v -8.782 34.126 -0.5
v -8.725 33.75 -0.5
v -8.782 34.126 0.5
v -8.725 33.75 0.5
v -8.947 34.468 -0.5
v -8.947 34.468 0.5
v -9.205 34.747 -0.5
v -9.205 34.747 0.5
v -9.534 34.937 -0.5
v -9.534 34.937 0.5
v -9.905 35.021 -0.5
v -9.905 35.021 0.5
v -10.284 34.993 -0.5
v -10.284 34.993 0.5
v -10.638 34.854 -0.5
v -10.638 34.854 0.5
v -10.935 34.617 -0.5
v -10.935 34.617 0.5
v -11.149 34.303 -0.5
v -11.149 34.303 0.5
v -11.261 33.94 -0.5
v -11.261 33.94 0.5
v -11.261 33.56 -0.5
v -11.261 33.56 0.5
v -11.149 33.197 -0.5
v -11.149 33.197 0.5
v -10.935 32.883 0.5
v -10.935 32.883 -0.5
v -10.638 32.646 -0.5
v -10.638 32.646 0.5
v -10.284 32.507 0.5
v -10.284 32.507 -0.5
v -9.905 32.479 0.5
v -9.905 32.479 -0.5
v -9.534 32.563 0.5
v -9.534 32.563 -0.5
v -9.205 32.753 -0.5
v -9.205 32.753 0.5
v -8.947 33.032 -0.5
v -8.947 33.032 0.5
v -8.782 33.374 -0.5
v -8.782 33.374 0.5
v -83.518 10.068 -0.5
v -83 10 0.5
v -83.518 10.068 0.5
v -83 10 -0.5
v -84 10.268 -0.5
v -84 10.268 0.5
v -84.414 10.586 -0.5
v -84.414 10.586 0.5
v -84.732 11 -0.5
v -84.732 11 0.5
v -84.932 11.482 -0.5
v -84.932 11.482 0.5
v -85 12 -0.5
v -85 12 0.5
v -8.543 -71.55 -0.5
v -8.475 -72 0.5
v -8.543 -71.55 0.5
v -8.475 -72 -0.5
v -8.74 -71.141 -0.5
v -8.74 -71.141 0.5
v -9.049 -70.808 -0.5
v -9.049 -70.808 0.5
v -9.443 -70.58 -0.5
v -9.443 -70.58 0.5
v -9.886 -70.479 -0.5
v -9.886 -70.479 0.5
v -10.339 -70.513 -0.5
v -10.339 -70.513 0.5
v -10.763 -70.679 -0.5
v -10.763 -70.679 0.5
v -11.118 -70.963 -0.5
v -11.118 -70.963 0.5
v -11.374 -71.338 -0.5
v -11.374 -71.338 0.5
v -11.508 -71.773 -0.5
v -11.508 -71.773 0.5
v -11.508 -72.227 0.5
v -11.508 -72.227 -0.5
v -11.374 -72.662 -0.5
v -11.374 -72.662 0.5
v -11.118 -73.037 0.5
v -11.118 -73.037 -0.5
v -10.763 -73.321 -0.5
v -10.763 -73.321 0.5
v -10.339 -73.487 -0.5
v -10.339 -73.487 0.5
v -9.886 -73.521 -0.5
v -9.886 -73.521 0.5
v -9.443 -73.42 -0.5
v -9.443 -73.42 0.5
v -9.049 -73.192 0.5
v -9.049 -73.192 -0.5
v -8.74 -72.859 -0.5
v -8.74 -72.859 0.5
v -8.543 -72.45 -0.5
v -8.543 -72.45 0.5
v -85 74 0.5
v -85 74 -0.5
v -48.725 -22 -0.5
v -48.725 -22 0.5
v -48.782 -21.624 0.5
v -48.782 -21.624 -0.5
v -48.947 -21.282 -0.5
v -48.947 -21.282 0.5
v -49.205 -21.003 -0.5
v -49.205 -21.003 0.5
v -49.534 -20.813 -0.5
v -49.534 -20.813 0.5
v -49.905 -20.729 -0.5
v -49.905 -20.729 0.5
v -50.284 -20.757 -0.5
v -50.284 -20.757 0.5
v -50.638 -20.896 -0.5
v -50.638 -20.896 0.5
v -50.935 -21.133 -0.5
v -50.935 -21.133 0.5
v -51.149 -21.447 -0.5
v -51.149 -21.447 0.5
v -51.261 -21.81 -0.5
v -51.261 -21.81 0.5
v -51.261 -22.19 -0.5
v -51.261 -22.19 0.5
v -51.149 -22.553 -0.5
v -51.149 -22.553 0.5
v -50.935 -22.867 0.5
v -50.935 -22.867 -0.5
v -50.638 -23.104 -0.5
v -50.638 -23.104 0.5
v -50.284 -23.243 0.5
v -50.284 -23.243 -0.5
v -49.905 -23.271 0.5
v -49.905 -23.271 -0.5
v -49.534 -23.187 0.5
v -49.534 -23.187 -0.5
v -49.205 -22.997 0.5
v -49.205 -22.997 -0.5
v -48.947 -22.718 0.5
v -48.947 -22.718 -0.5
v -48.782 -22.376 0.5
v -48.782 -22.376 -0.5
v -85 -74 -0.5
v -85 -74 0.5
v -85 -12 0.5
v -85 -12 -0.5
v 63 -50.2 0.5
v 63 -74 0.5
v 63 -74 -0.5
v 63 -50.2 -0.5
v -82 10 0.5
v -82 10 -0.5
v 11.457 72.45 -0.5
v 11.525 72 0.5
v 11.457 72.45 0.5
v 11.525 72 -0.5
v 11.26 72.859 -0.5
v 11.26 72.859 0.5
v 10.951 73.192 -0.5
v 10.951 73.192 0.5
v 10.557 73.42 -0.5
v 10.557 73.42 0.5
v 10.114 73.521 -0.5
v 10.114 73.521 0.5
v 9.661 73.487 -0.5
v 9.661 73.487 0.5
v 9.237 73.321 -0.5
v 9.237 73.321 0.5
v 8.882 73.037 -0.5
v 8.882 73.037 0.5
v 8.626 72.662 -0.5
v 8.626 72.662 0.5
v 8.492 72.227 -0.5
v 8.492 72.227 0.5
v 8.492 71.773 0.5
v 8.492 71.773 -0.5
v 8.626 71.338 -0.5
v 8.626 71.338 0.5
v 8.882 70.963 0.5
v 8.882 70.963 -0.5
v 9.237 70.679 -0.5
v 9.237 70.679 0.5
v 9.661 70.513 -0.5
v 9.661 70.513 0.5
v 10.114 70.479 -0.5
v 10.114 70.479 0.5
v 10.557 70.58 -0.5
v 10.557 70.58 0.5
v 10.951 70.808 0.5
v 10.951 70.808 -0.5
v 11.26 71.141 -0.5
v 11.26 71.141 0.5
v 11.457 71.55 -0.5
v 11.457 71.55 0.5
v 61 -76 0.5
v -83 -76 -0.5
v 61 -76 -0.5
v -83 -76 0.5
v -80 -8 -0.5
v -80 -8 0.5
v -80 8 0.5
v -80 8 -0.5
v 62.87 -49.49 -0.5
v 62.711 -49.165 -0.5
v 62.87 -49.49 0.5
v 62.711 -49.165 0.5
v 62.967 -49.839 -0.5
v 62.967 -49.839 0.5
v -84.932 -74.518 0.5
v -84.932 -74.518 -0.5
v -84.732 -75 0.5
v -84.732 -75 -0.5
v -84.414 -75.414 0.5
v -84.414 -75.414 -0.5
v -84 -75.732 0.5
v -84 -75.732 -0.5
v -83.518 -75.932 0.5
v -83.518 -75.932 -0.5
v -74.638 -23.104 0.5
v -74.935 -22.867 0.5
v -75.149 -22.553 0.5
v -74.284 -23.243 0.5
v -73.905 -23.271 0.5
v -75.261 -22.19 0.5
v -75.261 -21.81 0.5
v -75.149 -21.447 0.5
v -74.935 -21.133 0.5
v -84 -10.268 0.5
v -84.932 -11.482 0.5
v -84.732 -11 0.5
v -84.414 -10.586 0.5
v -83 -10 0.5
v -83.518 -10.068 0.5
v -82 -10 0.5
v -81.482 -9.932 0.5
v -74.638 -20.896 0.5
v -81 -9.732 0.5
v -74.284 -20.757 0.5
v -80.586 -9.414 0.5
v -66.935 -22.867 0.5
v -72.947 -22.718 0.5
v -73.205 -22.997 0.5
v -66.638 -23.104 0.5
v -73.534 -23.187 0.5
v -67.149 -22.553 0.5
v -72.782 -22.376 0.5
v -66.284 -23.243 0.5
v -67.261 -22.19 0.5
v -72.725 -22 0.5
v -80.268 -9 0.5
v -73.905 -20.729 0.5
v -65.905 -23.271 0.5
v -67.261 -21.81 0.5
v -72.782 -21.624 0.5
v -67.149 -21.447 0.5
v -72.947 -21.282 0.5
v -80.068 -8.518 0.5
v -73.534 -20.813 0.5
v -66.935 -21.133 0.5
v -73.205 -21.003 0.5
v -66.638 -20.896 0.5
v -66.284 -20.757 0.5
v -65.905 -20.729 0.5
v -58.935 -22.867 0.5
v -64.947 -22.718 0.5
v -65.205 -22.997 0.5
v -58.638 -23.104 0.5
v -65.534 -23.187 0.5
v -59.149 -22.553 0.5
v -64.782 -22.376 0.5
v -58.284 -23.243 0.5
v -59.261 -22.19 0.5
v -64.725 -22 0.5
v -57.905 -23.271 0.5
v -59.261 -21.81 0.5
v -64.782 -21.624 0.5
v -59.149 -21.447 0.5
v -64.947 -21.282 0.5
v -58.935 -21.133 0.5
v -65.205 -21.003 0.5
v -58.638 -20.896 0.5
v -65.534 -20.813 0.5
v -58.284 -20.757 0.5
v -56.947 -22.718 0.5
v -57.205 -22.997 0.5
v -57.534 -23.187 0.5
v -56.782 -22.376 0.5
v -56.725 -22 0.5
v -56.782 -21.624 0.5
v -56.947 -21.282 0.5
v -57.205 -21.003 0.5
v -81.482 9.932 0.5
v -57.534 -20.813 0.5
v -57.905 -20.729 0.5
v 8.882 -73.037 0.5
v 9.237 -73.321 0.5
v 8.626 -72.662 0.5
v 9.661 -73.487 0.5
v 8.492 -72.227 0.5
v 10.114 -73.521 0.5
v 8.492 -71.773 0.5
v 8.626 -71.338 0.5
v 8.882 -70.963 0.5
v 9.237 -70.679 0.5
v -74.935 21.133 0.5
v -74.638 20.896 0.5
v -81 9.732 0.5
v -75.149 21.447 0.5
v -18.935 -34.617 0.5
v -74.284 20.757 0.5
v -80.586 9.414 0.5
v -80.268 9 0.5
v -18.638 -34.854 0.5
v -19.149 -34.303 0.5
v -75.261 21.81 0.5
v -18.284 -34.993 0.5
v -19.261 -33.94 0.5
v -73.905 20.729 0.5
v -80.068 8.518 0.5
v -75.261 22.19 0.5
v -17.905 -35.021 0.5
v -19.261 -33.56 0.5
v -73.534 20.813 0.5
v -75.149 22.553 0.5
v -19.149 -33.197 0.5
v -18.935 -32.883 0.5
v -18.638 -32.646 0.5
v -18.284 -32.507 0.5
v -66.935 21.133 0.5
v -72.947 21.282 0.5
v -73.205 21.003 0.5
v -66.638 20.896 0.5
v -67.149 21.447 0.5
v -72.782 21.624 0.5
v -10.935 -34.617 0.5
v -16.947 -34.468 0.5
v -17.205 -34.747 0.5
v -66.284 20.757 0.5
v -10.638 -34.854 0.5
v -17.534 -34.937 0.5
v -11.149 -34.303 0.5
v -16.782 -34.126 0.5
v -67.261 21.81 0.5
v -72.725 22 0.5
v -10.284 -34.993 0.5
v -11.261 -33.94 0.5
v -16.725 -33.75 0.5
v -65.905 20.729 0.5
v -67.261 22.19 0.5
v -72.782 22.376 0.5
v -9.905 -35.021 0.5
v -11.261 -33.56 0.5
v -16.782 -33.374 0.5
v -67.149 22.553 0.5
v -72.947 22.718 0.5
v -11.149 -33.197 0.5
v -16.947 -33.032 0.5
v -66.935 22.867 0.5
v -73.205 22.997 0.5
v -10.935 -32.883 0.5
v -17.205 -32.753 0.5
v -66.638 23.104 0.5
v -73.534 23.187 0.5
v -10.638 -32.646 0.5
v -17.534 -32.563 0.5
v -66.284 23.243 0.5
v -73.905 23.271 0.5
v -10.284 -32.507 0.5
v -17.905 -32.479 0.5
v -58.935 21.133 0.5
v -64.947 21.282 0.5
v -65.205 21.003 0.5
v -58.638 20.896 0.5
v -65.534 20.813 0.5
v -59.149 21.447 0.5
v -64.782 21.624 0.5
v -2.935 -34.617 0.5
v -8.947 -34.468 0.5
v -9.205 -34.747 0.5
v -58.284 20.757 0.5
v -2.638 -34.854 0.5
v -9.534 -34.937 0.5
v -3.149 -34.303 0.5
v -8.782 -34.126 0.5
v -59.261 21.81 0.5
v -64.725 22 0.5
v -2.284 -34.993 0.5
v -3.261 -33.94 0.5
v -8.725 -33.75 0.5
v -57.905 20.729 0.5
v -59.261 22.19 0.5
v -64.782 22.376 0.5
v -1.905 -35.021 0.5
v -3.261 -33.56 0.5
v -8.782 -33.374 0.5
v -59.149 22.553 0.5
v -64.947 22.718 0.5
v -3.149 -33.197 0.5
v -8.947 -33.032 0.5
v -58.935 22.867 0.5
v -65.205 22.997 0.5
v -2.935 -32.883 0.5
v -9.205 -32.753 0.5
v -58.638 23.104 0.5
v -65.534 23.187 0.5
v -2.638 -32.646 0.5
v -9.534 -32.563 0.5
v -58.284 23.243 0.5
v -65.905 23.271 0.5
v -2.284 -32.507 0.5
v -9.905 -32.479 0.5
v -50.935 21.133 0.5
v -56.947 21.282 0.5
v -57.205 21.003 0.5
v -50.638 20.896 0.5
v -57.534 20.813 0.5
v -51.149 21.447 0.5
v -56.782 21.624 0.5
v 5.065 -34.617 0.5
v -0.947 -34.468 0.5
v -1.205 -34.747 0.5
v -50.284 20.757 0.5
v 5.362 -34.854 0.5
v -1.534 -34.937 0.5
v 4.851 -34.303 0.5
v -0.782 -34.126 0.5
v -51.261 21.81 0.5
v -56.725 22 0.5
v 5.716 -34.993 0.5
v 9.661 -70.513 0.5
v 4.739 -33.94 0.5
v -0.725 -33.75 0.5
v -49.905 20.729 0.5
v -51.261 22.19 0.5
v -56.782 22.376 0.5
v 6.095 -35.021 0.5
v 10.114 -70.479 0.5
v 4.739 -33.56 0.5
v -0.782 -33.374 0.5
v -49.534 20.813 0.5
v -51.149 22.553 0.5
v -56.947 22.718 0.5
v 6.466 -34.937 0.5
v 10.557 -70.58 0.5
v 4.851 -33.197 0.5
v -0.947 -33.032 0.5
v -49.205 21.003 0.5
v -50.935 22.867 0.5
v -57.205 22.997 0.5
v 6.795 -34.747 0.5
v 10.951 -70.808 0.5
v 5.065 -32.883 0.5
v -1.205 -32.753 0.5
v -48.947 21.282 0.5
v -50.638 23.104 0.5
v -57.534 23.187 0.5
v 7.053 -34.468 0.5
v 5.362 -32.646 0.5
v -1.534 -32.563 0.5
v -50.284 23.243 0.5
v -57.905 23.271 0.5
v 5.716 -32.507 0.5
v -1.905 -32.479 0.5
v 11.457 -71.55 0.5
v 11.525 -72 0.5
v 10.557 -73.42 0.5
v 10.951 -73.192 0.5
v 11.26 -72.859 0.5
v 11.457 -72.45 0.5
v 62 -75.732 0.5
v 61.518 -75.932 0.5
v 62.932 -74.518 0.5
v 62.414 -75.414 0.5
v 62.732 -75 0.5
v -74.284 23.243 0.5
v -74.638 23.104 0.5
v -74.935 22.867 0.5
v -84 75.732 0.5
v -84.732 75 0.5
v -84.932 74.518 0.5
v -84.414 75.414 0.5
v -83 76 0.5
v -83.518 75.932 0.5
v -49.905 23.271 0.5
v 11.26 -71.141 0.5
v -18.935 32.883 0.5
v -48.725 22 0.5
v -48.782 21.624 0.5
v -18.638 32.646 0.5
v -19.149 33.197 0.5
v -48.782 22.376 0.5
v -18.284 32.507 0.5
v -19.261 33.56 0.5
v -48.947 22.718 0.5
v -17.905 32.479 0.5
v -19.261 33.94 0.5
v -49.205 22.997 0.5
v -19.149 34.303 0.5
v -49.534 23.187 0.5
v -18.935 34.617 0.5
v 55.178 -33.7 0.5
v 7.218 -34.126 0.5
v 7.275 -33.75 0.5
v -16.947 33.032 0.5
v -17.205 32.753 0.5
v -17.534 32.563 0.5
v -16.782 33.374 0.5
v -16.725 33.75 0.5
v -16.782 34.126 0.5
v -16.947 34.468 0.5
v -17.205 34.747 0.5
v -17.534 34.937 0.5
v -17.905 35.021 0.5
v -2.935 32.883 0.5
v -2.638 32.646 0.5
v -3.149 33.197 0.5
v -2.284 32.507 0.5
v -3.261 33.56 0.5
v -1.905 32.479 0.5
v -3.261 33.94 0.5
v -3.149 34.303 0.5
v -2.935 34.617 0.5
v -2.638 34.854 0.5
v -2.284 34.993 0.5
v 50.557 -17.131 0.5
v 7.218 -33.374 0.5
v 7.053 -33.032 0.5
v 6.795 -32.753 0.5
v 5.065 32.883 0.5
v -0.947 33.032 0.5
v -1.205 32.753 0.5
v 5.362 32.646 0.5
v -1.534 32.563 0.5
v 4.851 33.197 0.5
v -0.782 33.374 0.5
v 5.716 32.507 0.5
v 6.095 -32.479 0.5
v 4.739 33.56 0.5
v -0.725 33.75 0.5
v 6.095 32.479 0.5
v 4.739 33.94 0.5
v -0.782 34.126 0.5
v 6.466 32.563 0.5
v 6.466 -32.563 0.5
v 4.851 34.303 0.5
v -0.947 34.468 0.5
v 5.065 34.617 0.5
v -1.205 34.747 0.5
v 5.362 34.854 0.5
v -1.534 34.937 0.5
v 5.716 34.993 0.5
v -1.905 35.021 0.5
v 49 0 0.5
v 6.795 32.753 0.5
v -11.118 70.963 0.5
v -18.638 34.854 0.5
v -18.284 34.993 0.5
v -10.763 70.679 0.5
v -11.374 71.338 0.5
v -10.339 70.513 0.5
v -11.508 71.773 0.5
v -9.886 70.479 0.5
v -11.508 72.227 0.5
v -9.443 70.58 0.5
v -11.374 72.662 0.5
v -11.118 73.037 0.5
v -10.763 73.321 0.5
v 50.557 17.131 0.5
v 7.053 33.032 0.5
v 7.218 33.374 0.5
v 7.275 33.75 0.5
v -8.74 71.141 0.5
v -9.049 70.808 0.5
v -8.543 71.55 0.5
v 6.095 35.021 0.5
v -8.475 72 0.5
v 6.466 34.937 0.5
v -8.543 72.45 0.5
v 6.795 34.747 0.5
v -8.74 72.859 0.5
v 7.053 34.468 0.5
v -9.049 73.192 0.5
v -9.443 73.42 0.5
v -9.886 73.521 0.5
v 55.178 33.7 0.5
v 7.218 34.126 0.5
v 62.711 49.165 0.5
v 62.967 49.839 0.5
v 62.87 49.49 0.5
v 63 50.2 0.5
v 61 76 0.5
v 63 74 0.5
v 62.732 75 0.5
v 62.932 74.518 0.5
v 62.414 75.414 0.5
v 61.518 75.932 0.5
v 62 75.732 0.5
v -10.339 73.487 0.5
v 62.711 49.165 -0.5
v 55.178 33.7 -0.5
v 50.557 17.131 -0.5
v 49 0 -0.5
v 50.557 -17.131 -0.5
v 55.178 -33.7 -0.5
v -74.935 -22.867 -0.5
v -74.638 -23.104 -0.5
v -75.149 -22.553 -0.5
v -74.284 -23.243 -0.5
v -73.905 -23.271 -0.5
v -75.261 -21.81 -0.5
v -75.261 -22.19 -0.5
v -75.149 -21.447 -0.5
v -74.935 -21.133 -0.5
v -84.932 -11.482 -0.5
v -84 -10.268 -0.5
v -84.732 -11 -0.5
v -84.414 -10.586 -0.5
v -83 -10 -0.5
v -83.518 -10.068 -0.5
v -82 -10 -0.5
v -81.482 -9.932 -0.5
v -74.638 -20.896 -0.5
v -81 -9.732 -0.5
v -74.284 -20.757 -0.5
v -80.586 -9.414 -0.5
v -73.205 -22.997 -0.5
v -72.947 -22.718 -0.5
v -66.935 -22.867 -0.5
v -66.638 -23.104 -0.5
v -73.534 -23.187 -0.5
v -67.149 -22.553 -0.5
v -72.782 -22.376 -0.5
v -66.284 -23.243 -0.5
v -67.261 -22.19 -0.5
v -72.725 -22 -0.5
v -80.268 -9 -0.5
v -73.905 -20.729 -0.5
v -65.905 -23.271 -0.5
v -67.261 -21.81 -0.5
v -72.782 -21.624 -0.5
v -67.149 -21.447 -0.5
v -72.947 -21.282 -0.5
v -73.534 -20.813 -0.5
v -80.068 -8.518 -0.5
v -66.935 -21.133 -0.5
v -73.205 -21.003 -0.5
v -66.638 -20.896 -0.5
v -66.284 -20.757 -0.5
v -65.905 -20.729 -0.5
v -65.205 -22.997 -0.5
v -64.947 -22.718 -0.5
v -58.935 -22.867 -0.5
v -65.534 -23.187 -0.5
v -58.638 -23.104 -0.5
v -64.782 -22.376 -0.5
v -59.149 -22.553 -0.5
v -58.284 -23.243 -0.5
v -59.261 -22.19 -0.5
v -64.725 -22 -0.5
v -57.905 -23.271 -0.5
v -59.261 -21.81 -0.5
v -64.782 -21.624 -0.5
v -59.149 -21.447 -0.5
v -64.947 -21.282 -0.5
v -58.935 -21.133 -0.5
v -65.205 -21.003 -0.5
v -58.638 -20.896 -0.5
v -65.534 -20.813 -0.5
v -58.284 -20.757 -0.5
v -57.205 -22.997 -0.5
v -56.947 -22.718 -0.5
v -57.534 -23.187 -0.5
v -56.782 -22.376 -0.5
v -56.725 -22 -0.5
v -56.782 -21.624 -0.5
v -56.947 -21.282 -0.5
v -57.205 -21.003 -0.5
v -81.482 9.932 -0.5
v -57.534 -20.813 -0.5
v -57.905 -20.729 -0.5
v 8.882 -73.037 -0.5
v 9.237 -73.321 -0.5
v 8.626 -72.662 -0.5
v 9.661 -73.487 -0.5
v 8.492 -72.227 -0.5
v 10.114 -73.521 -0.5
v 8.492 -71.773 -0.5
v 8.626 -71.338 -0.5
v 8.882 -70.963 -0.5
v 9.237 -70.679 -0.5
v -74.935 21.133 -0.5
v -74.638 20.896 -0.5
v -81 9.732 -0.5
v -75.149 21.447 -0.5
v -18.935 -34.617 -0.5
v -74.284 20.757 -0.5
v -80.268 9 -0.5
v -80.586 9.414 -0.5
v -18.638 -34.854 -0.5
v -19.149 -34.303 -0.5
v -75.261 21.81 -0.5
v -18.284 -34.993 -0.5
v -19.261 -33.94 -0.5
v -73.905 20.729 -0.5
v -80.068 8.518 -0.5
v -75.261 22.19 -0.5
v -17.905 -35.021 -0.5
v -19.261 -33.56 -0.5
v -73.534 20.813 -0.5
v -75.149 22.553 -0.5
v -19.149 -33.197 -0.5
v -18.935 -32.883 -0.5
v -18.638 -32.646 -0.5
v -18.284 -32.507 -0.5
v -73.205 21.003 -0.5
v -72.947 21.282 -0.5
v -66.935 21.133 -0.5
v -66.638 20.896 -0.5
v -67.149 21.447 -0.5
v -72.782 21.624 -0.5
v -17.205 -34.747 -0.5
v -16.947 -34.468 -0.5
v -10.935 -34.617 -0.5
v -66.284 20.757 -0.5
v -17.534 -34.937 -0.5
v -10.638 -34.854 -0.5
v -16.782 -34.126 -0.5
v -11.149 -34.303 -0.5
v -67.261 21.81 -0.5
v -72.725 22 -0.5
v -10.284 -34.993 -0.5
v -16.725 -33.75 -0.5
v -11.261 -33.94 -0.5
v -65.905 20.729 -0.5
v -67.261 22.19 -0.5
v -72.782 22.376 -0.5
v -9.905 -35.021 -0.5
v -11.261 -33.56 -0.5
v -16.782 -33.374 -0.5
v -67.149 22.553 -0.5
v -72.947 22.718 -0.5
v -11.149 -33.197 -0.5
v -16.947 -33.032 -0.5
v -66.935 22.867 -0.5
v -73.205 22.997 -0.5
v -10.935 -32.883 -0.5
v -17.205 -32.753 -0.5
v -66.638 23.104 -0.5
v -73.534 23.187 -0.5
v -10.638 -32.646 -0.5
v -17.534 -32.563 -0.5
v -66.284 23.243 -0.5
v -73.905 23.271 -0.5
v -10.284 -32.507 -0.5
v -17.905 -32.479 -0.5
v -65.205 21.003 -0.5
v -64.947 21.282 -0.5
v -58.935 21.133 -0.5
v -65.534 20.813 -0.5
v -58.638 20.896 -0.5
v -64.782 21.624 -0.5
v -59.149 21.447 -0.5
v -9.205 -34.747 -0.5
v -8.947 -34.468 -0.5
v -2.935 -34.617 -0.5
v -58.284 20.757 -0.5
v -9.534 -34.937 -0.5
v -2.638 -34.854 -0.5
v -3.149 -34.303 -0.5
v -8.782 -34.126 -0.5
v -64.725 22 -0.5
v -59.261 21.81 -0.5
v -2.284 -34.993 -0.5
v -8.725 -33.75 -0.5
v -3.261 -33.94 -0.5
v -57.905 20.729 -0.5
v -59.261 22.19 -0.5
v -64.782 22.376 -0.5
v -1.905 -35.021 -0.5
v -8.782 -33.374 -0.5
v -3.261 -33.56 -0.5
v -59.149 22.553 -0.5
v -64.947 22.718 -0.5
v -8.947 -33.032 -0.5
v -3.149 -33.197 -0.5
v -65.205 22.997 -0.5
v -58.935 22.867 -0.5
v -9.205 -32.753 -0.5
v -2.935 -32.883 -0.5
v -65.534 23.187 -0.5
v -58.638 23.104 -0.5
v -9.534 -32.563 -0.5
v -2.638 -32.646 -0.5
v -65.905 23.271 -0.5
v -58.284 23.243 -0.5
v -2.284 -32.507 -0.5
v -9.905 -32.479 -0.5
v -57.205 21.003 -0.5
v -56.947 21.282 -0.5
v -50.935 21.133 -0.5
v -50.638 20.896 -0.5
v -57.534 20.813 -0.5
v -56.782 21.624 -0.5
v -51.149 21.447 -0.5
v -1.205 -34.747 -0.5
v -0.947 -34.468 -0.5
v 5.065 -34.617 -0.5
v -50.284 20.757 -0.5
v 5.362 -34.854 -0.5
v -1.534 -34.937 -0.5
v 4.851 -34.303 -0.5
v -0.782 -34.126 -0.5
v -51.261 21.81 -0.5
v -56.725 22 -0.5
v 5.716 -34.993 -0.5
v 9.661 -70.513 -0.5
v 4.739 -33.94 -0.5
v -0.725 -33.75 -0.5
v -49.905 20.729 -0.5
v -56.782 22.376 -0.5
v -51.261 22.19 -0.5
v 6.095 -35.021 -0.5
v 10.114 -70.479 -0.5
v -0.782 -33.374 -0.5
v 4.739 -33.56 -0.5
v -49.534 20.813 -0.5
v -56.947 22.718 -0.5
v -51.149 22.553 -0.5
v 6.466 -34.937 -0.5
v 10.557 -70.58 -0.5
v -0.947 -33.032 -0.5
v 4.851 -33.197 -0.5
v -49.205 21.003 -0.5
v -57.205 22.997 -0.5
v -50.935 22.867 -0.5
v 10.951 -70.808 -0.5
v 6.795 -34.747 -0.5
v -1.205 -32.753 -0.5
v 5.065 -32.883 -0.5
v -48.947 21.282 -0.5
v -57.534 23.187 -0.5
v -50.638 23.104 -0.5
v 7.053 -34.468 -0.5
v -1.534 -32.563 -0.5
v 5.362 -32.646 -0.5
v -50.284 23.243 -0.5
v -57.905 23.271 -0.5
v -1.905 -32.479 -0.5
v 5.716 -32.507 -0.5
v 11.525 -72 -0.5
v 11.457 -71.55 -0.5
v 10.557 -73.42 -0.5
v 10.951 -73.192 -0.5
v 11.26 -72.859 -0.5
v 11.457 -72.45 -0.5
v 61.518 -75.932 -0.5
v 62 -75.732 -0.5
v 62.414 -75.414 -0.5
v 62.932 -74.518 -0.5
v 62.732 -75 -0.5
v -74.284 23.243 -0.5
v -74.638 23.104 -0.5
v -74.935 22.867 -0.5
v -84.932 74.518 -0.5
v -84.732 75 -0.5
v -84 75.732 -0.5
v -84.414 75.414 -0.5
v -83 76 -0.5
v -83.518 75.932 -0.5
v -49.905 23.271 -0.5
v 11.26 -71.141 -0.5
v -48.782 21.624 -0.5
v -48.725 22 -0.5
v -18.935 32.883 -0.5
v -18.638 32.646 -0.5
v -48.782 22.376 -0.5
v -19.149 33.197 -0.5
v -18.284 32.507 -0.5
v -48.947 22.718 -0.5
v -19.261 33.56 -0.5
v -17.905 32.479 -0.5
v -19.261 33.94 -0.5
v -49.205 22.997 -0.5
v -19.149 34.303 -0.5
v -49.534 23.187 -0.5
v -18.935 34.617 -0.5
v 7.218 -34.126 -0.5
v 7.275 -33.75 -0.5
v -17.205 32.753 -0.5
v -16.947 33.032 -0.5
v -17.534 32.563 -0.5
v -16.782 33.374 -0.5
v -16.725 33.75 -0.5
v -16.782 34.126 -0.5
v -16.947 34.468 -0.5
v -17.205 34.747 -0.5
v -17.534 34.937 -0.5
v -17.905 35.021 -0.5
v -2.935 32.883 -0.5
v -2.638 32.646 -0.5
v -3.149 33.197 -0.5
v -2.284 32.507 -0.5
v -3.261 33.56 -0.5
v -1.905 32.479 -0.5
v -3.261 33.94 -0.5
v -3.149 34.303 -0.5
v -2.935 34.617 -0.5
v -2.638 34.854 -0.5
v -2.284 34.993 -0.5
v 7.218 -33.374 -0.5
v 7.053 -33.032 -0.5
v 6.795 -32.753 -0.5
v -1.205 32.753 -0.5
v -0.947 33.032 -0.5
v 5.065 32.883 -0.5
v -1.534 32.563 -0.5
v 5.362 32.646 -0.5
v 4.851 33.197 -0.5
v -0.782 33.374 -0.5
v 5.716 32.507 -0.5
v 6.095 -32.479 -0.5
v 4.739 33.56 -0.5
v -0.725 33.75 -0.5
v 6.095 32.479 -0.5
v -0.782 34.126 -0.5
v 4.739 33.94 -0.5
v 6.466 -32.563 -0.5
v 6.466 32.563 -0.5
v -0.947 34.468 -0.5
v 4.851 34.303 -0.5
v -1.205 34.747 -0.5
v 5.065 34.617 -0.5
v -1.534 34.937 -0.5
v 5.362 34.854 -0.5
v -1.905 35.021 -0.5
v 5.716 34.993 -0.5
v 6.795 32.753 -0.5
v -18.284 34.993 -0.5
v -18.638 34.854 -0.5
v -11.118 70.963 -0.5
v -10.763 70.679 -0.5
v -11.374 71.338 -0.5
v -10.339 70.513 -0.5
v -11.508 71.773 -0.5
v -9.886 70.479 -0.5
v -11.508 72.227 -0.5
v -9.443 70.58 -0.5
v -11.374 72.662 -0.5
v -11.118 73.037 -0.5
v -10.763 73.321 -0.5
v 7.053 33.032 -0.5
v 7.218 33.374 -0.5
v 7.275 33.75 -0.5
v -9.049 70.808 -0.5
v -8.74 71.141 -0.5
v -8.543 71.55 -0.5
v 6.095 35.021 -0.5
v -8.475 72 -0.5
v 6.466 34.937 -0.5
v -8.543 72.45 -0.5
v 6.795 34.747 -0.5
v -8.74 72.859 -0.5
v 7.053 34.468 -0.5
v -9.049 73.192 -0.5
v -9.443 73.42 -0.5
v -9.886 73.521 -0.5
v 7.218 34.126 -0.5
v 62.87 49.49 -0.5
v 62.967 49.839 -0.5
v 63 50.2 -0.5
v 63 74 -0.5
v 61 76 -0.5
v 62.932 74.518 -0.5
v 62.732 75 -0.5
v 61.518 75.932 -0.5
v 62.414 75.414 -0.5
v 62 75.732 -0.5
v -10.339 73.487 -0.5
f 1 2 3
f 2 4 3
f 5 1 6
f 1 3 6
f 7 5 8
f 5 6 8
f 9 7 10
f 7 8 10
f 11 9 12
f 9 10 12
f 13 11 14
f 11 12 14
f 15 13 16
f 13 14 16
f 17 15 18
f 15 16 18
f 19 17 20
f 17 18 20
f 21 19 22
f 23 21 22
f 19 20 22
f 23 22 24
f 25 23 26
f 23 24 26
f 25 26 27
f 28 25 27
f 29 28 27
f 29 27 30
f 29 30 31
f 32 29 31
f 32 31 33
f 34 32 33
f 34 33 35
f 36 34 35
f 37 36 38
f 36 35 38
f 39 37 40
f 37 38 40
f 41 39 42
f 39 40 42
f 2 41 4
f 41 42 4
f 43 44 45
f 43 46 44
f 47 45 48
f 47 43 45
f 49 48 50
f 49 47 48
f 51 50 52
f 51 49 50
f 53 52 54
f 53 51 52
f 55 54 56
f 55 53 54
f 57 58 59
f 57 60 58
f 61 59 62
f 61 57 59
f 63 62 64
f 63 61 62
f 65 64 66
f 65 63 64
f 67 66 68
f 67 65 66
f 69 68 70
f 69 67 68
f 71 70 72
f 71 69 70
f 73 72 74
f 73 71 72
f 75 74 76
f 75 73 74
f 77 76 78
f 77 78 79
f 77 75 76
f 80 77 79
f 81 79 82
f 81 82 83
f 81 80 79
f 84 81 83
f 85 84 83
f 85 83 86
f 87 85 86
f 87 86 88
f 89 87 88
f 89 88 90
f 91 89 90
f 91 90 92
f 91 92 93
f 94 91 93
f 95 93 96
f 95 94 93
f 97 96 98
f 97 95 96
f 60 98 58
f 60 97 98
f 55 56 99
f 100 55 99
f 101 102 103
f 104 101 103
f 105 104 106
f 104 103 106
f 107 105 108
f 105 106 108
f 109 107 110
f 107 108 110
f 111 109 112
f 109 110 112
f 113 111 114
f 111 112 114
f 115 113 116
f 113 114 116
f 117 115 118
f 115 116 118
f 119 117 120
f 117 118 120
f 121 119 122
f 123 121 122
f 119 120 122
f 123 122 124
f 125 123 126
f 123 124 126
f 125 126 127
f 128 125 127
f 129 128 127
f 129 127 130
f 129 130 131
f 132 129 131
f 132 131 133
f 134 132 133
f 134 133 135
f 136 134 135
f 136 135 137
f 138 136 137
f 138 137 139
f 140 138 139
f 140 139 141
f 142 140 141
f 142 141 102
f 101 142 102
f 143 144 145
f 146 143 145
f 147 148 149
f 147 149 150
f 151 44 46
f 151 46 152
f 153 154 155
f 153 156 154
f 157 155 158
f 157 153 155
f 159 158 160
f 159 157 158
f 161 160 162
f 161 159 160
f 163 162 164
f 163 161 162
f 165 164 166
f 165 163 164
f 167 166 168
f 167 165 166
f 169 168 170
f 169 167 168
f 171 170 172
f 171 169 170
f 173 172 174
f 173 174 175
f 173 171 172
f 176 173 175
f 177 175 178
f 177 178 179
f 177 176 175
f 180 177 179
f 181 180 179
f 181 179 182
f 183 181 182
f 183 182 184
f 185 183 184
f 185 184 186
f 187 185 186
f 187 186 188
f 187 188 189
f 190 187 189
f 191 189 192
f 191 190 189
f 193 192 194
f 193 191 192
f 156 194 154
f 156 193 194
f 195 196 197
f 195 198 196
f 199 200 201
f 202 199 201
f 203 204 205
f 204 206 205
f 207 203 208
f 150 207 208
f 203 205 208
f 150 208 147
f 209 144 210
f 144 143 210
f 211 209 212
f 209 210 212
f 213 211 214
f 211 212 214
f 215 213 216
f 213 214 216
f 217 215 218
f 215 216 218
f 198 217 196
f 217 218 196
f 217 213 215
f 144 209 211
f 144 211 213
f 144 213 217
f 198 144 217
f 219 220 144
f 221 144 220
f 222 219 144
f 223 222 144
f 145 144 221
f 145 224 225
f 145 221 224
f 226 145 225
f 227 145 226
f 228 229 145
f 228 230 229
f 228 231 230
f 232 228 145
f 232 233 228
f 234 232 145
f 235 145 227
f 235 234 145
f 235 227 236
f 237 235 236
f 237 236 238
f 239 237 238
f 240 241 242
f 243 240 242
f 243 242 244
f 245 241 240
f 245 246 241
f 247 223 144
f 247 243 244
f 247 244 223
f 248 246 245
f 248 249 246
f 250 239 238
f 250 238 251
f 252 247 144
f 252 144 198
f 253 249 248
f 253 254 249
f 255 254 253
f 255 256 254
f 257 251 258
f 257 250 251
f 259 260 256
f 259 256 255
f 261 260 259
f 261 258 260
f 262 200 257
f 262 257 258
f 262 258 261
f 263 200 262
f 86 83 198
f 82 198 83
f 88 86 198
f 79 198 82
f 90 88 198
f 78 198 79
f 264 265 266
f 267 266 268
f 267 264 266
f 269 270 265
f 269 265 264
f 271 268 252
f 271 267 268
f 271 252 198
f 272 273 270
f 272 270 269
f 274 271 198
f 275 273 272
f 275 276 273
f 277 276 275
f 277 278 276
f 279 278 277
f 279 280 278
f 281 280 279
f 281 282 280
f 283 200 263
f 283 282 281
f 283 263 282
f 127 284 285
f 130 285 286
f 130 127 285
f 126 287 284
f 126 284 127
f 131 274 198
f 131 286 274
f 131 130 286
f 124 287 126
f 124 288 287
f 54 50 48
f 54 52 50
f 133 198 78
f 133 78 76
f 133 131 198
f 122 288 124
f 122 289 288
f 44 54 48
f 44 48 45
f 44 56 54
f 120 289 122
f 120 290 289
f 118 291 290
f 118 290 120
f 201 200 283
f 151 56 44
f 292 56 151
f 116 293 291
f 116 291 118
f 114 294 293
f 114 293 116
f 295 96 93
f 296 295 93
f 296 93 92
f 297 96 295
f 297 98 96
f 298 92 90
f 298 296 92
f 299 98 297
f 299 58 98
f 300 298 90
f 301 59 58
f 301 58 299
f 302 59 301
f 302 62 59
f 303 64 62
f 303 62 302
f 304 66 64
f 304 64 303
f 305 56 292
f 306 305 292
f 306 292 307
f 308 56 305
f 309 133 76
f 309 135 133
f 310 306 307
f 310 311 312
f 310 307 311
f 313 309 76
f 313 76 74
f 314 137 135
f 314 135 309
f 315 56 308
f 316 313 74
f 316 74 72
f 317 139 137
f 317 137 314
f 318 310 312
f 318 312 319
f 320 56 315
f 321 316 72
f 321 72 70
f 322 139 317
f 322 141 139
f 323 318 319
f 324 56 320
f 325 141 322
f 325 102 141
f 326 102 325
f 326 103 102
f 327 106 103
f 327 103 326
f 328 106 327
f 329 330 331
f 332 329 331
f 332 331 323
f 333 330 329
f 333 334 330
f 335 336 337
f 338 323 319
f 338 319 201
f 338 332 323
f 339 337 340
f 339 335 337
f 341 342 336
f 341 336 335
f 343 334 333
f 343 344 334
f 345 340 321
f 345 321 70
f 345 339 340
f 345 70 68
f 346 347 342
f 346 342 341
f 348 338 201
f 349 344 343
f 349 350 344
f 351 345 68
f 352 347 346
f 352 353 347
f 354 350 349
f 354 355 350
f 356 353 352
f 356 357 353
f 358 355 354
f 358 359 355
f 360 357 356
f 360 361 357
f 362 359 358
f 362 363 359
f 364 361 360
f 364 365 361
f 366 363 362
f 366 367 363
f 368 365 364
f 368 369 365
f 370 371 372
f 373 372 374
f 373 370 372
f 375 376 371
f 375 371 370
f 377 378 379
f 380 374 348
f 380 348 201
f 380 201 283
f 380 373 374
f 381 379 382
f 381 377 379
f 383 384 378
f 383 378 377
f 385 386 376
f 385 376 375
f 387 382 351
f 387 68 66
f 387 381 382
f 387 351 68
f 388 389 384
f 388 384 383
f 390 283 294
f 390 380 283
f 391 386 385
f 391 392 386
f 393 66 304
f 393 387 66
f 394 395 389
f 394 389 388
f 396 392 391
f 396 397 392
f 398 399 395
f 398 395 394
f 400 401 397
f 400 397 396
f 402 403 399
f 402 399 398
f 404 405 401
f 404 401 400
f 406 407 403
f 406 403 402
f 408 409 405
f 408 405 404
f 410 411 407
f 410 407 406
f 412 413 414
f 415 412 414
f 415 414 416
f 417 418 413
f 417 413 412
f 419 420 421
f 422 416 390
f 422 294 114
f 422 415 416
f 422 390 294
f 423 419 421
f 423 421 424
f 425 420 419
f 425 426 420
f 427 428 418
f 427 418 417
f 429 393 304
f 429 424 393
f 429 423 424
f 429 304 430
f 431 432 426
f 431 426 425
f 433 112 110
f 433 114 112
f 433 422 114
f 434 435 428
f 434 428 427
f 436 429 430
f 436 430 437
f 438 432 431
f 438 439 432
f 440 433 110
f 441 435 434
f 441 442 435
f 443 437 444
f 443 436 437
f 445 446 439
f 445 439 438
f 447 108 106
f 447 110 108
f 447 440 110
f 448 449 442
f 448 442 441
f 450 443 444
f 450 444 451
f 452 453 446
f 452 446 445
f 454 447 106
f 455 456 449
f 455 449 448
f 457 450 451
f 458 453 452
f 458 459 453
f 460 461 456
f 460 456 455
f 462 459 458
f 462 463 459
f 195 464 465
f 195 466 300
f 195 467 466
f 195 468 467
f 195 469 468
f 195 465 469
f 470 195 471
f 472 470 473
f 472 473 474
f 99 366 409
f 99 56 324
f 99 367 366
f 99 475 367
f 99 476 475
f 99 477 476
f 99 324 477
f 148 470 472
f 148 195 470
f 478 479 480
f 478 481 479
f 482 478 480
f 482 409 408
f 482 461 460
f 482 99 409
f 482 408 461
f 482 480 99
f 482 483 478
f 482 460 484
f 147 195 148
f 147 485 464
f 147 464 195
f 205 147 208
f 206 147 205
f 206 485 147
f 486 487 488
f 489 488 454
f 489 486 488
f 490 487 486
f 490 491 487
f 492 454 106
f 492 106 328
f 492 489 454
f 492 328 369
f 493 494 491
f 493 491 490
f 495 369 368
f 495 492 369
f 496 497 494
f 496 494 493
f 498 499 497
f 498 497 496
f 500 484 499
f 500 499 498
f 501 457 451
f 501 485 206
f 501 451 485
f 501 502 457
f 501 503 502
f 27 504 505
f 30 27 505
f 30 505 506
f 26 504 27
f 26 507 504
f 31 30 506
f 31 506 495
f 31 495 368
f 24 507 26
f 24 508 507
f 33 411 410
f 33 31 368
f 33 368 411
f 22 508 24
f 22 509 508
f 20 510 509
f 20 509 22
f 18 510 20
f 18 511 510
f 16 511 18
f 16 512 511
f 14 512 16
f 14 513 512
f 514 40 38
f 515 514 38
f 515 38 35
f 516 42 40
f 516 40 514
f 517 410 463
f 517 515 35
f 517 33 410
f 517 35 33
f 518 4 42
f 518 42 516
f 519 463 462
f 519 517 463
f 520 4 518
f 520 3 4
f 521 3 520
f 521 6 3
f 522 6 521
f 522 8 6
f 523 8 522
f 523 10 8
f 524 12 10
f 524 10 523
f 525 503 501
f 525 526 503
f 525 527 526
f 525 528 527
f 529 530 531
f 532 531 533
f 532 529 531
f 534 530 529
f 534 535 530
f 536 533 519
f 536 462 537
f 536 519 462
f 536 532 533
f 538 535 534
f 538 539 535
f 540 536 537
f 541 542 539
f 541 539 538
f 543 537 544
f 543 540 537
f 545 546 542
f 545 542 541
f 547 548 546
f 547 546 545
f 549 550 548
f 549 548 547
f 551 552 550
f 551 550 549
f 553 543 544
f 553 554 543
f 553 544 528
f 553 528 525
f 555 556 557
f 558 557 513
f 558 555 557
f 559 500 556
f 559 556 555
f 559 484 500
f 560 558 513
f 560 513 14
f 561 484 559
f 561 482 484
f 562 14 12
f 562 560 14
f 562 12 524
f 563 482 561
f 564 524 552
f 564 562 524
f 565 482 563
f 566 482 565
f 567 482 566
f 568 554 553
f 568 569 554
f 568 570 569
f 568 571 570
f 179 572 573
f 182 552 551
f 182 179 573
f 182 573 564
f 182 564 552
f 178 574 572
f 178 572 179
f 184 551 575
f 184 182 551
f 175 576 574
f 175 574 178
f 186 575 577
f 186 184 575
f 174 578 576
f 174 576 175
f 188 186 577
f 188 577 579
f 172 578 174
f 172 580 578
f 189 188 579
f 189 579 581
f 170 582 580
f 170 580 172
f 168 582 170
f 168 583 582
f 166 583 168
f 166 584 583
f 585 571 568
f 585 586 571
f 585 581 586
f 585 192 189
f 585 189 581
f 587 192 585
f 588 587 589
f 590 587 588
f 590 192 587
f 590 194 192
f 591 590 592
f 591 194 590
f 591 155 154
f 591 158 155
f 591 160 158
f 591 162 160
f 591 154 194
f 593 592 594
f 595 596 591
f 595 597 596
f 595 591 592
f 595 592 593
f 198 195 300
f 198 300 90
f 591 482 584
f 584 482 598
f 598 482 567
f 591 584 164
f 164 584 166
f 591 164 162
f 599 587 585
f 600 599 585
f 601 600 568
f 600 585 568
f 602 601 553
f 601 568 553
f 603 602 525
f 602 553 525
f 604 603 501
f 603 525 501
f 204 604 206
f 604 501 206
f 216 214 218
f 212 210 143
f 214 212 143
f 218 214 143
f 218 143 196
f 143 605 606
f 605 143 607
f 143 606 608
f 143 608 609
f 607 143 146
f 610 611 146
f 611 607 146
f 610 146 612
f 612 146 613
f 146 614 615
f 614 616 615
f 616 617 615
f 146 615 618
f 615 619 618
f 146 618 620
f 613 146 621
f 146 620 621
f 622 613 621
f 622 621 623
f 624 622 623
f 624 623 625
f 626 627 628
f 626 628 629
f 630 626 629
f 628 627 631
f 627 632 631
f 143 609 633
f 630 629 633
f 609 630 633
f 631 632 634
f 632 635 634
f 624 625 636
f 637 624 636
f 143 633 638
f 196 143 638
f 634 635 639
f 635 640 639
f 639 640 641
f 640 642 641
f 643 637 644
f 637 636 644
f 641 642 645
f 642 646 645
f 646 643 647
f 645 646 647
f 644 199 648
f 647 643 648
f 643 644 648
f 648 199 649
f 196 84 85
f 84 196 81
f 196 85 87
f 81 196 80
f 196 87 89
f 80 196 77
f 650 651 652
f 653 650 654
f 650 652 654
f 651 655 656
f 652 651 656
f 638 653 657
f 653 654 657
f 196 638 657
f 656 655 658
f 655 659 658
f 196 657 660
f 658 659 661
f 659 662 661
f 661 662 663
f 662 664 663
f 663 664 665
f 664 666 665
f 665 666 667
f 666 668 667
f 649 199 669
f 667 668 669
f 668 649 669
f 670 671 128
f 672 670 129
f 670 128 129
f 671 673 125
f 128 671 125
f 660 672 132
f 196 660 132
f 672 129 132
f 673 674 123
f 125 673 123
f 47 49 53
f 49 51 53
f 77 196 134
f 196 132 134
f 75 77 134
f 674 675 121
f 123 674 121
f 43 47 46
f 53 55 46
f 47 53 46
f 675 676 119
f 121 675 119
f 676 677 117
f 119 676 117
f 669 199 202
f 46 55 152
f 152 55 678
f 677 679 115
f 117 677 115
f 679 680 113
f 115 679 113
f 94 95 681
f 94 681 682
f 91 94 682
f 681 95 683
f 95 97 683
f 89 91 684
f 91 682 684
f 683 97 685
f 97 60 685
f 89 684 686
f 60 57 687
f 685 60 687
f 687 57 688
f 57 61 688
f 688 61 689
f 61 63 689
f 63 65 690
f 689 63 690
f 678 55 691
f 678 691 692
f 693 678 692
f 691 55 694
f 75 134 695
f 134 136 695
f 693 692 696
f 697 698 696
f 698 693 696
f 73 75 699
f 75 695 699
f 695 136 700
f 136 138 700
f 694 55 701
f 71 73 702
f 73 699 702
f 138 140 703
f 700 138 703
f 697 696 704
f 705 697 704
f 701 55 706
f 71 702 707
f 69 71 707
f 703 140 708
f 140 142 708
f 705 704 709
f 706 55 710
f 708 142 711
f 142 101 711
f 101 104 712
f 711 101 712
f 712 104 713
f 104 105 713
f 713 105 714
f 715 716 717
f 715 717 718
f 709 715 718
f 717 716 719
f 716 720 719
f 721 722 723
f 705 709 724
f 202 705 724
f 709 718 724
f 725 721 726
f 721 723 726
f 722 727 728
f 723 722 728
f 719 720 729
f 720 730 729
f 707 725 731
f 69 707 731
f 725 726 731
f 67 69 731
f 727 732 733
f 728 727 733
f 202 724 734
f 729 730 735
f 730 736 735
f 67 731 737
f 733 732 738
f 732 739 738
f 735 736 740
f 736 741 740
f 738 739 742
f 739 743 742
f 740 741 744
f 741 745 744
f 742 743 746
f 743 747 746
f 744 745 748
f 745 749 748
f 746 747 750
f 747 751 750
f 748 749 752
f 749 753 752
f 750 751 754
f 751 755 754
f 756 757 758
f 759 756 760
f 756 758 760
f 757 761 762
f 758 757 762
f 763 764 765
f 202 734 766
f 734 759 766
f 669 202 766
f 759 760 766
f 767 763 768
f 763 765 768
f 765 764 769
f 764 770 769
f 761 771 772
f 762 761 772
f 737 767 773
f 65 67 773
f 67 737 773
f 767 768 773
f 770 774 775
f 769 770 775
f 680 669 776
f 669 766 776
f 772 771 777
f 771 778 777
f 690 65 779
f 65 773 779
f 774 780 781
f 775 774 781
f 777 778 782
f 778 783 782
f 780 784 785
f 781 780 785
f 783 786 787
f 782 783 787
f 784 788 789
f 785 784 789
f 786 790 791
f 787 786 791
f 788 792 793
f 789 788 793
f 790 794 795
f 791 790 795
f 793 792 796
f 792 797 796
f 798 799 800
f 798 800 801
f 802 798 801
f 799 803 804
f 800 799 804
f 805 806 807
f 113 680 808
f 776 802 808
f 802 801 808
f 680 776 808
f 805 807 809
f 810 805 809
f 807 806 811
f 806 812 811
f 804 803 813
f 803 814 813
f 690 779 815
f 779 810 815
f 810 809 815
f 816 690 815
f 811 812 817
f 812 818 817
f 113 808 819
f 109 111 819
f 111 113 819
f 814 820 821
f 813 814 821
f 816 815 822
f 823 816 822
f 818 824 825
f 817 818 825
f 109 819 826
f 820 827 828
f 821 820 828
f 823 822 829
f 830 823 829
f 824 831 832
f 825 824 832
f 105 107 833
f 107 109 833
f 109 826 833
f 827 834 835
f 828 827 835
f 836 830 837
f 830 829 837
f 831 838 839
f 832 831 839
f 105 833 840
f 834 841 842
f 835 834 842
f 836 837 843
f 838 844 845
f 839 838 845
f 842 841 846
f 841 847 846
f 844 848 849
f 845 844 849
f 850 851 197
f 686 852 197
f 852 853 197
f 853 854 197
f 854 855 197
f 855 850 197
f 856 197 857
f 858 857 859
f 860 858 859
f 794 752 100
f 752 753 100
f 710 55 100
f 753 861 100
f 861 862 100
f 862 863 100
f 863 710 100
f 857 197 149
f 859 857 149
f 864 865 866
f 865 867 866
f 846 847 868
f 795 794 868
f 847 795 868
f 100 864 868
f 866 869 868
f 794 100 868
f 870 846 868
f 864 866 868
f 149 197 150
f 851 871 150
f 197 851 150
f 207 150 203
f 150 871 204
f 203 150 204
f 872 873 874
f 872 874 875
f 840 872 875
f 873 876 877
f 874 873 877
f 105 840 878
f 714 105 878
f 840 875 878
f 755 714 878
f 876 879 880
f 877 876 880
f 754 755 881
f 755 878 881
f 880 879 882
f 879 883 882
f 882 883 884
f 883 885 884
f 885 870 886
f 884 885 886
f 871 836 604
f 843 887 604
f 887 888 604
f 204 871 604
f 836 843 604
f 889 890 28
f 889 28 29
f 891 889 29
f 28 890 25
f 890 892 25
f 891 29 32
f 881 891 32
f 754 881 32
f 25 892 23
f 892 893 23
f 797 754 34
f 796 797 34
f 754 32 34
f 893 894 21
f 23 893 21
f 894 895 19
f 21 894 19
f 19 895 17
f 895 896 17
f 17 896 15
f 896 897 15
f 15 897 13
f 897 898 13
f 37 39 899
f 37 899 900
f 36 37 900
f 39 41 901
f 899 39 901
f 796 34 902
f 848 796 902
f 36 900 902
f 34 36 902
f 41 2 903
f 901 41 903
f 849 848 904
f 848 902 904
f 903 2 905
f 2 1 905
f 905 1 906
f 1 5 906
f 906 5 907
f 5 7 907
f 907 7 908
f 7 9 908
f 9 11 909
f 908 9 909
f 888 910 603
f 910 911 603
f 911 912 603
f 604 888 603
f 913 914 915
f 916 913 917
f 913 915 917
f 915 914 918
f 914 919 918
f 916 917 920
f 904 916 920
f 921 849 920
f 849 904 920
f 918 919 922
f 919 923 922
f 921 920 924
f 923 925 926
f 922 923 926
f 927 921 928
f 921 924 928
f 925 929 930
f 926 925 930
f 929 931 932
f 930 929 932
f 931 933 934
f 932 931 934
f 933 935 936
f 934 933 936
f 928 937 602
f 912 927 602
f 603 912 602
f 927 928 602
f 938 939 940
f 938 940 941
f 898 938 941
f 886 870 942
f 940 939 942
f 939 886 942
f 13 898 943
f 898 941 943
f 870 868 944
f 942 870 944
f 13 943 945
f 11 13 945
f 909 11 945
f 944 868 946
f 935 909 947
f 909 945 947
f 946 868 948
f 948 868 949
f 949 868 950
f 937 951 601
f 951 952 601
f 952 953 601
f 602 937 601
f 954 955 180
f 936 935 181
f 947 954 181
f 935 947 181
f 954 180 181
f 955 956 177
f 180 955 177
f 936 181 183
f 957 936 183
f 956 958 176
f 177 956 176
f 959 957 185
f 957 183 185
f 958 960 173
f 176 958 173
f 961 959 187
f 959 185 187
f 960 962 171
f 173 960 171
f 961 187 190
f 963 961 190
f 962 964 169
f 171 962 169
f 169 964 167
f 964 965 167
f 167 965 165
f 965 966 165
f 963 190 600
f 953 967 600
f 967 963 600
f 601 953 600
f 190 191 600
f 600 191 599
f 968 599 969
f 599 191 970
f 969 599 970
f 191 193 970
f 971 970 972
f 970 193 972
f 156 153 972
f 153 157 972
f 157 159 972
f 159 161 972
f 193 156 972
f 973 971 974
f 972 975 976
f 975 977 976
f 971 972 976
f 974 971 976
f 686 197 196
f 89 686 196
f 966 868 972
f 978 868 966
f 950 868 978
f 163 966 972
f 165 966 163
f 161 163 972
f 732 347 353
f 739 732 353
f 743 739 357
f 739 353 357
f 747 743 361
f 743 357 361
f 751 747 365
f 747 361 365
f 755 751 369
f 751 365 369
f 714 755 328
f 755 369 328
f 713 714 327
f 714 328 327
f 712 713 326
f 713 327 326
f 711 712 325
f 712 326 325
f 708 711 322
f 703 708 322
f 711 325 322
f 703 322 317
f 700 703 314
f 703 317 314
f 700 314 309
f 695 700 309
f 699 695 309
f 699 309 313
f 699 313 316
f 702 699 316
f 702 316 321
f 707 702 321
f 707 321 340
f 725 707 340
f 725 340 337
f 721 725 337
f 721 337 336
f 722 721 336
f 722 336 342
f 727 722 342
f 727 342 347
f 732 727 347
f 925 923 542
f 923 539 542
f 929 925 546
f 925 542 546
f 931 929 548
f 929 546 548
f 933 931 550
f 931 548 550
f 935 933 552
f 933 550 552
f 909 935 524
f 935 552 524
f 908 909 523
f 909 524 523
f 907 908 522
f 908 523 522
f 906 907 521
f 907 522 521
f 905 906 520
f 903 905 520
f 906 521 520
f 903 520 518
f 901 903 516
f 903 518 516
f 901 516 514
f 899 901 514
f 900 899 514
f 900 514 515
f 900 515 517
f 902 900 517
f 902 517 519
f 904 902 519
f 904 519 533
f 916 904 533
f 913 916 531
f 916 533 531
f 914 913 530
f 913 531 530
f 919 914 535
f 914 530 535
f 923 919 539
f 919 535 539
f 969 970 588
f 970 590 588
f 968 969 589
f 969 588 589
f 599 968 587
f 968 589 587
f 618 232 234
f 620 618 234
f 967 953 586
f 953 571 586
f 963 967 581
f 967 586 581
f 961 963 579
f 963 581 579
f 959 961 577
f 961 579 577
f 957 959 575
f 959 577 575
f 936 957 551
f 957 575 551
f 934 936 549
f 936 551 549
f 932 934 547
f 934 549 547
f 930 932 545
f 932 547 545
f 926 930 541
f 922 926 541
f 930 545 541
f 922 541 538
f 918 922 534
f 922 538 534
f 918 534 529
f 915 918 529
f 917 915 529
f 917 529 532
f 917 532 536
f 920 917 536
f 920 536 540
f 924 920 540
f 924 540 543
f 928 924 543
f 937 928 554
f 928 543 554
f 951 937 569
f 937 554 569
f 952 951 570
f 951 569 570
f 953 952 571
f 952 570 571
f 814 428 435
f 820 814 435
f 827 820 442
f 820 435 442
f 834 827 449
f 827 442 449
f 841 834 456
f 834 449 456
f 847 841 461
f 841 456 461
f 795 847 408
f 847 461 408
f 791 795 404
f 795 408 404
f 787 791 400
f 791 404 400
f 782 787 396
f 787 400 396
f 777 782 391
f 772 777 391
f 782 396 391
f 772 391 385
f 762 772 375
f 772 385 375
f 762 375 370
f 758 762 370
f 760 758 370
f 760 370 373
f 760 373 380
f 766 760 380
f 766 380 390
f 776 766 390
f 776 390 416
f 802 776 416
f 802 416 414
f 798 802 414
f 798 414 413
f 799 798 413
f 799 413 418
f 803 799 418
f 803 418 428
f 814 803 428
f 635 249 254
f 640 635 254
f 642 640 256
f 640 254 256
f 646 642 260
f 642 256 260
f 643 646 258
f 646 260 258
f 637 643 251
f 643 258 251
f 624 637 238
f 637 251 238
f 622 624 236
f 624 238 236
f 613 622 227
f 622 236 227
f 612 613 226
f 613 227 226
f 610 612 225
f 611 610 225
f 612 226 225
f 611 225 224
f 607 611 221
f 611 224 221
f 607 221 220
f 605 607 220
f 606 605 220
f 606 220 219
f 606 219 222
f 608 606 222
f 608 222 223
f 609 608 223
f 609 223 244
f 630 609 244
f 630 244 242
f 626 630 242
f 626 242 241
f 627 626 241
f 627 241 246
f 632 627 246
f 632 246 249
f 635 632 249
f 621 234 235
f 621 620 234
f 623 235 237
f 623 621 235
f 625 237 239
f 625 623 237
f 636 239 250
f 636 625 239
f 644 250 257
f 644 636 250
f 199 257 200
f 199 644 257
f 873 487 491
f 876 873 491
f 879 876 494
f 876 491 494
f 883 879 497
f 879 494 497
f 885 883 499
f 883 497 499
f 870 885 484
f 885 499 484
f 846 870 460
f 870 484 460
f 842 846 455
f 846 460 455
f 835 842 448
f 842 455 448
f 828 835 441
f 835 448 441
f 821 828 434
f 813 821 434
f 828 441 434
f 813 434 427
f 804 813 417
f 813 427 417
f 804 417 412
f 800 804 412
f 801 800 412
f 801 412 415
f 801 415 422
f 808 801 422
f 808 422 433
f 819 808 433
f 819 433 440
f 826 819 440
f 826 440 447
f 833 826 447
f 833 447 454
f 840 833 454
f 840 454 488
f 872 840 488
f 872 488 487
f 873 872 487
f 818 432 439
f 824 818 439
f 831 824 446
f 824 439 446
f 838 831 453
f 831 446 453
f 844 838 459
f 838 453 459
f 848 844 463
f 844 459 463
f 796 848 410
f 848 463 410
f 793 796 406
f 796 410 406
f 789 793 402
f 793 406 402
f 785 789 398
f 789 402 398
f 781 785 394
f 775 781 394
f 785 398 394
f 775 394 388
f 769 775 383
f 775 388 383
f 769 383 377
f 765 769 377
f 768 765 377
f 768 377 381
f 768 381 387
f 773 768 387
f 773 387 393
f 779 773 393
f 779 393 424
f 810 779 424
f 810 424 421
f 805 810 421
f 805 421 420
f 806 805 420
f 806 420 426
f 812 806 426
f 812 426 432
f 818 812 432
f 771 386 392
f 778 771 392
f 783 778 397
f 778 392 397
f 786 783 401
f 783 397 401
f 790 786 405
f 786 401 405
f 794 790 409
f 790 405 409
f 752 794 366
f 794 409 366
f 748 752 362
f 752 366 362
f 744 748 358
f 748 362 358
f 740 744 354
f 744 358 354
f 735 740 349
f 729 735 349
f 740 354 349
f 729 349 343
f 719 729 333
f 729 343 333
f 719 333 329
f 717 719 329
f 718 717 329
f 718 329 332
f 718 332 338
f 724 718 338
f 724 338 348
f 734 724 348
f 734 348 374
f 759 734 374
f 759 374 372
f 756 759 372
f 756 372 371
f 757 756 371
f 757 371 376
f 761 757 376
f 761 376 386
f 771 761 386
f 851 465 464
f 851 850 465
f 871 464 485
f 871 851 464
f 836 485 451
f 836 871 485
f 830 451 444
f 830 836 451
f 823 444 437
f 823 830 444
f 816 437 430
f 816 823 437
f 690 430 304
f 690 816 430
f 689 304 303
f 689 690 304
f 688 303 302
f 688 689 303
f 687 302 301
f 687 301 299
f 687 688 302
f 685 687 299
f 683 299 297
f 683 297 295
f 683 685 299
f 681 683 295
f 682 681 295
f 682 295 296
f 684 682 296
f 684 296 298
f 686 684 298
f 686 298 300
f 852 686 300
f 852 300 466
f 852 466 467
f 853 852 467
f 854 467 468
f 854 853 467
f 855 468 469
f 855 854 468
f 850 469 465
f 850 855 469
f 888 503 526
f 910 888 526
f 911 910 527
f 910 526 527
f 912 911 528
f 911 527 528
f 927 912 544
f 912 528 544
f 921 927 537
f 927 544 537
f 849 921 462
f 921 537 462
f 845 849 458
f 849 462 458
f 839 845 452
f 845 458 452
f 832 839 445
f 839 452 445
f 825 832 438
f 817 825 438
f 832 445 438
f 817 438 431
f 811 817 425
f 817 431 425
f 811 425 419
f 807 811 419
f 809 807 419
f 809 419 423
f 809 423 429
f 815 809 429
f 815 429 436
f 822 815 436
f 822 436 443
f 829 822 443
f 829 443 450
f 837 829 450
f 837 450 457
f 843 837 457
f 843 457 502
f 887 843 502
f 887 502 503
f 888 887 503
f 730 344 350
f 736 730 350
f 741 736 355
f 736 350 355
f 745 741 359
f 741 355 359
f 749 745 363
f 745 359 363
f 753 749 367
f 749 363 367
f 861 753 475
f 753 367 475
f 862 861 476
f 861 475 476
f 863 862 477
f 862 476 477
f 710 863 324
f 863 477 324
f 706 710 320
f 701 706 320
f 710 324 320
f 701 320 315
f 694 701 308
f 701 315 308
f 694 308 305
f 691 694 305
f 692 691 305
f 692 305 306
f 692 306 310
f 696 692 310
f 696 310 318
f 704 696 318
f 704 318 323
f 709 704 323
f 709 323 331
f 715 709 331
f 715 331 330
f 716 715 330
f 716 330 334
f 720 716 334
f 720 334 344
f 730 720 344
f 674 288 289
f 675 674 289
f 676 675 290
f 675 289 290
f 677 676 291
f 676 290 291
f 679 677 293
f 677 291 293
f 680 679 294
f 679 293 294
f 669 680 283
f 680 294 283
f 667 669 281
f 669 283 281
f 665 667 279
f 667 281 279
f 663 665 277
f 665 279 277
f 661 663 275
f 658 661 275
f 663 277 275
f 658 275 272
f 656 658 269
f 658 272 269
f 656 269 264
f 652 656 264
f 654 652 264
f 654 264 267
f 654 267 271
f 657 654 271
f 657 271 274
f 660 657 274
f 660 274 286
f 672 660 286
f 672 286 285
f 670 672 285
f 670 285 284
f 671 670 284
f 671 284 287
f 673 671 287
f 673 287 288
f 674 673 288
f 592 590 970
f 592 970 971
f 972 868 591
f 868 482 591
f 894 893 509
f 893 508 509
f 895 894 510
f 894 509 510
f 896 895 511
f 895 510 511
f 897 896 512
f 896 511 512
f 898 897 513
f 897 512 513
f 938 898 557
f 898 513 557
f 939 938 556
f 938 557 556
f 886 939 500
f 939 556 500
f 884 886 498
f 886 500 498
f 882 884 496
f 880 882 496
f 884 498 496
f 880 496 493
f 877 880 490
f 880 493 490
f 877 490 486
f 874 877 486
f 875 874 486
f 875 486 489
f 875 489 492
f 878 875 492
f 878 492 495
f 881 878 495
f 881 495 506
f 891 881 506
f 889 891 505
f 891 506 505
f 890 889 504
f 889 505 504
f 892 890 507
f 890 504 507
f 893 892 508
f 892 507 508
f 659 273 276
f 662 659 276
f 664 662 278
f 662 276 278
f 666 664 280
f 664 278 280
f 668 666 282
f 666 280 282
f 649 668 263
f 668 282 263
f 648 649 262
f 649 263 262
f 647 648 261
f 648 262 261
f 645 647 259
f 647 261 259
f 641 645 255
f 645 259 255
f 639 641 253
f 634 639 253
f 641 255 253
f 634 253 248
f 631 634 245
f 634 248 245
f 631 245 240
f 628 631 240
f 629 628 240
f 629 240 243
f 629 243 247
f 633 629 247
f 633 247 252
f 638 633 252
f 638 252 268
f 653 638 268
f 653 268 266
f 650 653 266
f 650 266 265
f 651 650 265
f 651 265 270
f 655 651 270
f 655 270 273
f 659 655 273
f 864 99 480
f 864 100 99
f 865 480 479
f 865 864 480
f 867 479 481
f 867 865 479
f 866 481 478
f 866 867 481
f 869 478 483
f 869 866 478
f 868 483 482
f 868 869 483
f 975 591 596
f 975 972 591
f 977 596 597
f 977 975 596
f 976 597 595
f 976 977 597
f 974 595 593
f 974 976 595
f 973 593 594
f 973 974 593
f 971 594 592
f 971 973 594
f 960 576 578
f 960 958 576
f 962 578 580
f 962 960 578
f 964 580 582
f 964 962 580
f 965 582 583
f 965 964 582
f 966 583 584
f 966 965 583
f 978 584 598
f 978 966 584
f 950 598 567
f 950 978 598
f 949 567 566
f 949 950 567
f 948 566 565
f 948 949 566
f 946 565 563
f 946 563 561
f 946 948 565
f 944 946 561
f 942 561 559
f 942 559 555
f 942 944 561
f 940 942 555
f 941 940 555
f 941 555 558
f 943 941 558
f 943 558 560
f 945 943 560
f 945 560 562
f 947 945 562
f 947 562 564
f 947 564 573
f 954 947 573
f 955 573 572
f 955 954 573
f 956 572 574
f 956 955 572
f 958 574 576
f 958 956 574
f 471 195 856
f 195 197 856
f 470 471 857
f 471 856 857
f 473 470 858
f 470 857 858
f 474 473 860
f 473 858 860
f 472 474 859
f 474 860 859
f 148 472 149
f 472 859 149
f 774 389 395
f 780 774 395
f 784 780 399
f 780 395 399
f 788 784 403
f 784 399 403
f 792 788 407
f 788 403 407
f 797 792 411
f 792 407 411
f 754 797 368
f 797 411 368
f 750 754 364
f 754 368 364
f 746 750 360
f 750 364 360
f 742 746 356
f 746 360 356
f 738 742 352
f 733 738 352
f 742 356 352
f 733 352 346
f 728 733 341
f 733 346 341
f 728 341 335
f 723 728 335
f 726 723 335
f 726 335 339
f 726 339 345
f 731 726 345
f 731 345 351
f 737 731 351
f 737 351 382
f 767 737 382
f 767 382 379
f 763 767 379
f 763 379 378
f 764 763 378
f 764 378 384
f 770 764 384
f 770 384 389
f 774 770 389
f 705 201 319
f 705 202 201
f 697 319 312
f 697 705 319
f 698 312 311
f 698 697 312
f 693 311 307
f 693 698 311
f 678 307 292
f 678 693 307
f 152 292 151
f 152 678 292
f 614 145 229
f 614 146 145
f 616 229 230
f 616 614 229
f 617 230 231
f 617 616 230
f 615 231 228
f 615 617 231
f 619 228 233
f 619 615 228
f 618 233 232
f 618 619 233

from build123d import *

# Parameters (mm, degrees)
SKETCH_1_W             = 89
SKETCH_1_H             = 152
SKETCH_1_R             = 1.525
EXTRUDE_1_DEPTH        = 0.5
SKETCH_2_R             = 1.275
CUT_EXTRUDE_1_DEPTH    = 5
SKETCH_4_W             = 29
SKETCH_4_H             = 152
EXTRUDE_3_DEPTH        = 1
SKETCH_5_R             = 95
CUT_EXTRUDE_3_DEPTH    = 22
SKETCH_9_W             = 30
SKETCH_9_H             = 152
EXTRUDE_4_DEPTH        = 1
PATTERN_LINEAR_1_COUNT = 4
PATTERN_LINEAR_1_PITCH = 8
SKETCH_10_W            = 10
SKETCH_10_H            = 20
CUT_EXTRUDE_4_DEPTH    = 10
FILLET_1_R             = 2


with BuildPart() as part:
    # 草图1 → 凸台-拉伸1 (new body, symmetric)
    with BuildSketch(Plane.XY):
        with Locations((-10.5, 0)):
            Rectangle(SKETCH_1_W, SKETCH_1_H)
        with Locations((-10, 72)):
            Circle(SKETCH_1_R, mode=Mode.SUBTRACT)
        with Locations((10, 72)):
            Circle(SKETCH_1_R, mode=Mode.SUBTRACT)
        with Locations((10, -72)):
            Circle(SKETCH_1_R, mode=Mode.SUBTRACT)
        with Locations((-10, -72)):
            Circle(SKETCH_1_R, mode=Mode.SUBTRACT)
    extrude(amount=EXTRUDE_1_DEPTH, both=True)

    # 草图2 → 切除-拉伸1 (cut, symmetric)
    with BuildSketch(Plane.XY.offset(0.5)):
        with Locations((-50, 22)):
            Circle(SKETCH_2_R)
        with Locations((-50, -22)):
            Circle(SKETCH_2_R)
        with Locations((6, -33.75)):
            Circle(SKETCH_2_R)
        with Locations((6, 33.75)):
            Circle(SKETCH_2_R)
    cut_extrude_1 = extrude(amount=CUT_EXTRUDE_1_DEPTH, both=True, mode=Mode.SUBTRACT)

    # 草图4 → 凸台-拉伸3 (add)
    with BuildSketch(Plane.XY.offset(0.5)):
        with Locations((48.5, 0)):
            Rectangle(SKETCH_4_W, SKETCH_4_H)
    extrude(amount=-EXTRUDE_3_DEPTH)

    # 草图5 → 切除-拉伸3 (cut)
    with BuildSketch(Plane.XY.offset(0.5)):
        with Locations((144, 0)):
            Circle(SKETCH_5_R)
    extrude(amount=-CUT_EXTRUDE_3_DEPTH, mode=Mode.SUBTRACT)

    # 草图9 → 凸台-拉伸4 (add)
    with BuildSketch(Plane.XY.offset(0.5)):
        with Locations((-70, 0)):
            Rectangle(SKETCH_9_W, SKETCH_9_H)
    extrude(amount=-EXTRUDE_4_DEPTH)

    # 阵列(线性)1: 切除-拉伸1 ×4
    with Locations(*[(-i * PATTERN_LINEAR_1_PITCH, 0, 0) for i in range(1, PATTERN_LINEAR_1_COUNT)]):
        add(cut_extrude_1, mode=Mode.SUBTRACT)

    # 草图10 → 切除-拉伸4 (cut)
    with BuildSketch(Plane.XY.offset(0.5)):
        with Locations((-85, 0)):
            Rectangle(SKETCH_10_W, SKETCH_10_H)
    extrude(amount=-CUT_EXTRUDE_4_DEPTH, mode=Mode.SUBTRACT)

    # 圆角1
    fillet_1_edges = [part.edges().sort_by_distance(p)[0] for p in [
        (-85, 10, 0),
        (-85, -10, 0),
        (-80, 10, 0),
        (-80, -10, 0),
        (63, 76, 0),
        (63, -76, 0),
        (63, -49.638694584, 0),
        (63, 49.638694584, 0),
        (-85, -76, 0),
        (-85, 76, 0),
    ]]
    fillet(fillet_1_edges, radius=FILLET_1_R)


solid = part.part
